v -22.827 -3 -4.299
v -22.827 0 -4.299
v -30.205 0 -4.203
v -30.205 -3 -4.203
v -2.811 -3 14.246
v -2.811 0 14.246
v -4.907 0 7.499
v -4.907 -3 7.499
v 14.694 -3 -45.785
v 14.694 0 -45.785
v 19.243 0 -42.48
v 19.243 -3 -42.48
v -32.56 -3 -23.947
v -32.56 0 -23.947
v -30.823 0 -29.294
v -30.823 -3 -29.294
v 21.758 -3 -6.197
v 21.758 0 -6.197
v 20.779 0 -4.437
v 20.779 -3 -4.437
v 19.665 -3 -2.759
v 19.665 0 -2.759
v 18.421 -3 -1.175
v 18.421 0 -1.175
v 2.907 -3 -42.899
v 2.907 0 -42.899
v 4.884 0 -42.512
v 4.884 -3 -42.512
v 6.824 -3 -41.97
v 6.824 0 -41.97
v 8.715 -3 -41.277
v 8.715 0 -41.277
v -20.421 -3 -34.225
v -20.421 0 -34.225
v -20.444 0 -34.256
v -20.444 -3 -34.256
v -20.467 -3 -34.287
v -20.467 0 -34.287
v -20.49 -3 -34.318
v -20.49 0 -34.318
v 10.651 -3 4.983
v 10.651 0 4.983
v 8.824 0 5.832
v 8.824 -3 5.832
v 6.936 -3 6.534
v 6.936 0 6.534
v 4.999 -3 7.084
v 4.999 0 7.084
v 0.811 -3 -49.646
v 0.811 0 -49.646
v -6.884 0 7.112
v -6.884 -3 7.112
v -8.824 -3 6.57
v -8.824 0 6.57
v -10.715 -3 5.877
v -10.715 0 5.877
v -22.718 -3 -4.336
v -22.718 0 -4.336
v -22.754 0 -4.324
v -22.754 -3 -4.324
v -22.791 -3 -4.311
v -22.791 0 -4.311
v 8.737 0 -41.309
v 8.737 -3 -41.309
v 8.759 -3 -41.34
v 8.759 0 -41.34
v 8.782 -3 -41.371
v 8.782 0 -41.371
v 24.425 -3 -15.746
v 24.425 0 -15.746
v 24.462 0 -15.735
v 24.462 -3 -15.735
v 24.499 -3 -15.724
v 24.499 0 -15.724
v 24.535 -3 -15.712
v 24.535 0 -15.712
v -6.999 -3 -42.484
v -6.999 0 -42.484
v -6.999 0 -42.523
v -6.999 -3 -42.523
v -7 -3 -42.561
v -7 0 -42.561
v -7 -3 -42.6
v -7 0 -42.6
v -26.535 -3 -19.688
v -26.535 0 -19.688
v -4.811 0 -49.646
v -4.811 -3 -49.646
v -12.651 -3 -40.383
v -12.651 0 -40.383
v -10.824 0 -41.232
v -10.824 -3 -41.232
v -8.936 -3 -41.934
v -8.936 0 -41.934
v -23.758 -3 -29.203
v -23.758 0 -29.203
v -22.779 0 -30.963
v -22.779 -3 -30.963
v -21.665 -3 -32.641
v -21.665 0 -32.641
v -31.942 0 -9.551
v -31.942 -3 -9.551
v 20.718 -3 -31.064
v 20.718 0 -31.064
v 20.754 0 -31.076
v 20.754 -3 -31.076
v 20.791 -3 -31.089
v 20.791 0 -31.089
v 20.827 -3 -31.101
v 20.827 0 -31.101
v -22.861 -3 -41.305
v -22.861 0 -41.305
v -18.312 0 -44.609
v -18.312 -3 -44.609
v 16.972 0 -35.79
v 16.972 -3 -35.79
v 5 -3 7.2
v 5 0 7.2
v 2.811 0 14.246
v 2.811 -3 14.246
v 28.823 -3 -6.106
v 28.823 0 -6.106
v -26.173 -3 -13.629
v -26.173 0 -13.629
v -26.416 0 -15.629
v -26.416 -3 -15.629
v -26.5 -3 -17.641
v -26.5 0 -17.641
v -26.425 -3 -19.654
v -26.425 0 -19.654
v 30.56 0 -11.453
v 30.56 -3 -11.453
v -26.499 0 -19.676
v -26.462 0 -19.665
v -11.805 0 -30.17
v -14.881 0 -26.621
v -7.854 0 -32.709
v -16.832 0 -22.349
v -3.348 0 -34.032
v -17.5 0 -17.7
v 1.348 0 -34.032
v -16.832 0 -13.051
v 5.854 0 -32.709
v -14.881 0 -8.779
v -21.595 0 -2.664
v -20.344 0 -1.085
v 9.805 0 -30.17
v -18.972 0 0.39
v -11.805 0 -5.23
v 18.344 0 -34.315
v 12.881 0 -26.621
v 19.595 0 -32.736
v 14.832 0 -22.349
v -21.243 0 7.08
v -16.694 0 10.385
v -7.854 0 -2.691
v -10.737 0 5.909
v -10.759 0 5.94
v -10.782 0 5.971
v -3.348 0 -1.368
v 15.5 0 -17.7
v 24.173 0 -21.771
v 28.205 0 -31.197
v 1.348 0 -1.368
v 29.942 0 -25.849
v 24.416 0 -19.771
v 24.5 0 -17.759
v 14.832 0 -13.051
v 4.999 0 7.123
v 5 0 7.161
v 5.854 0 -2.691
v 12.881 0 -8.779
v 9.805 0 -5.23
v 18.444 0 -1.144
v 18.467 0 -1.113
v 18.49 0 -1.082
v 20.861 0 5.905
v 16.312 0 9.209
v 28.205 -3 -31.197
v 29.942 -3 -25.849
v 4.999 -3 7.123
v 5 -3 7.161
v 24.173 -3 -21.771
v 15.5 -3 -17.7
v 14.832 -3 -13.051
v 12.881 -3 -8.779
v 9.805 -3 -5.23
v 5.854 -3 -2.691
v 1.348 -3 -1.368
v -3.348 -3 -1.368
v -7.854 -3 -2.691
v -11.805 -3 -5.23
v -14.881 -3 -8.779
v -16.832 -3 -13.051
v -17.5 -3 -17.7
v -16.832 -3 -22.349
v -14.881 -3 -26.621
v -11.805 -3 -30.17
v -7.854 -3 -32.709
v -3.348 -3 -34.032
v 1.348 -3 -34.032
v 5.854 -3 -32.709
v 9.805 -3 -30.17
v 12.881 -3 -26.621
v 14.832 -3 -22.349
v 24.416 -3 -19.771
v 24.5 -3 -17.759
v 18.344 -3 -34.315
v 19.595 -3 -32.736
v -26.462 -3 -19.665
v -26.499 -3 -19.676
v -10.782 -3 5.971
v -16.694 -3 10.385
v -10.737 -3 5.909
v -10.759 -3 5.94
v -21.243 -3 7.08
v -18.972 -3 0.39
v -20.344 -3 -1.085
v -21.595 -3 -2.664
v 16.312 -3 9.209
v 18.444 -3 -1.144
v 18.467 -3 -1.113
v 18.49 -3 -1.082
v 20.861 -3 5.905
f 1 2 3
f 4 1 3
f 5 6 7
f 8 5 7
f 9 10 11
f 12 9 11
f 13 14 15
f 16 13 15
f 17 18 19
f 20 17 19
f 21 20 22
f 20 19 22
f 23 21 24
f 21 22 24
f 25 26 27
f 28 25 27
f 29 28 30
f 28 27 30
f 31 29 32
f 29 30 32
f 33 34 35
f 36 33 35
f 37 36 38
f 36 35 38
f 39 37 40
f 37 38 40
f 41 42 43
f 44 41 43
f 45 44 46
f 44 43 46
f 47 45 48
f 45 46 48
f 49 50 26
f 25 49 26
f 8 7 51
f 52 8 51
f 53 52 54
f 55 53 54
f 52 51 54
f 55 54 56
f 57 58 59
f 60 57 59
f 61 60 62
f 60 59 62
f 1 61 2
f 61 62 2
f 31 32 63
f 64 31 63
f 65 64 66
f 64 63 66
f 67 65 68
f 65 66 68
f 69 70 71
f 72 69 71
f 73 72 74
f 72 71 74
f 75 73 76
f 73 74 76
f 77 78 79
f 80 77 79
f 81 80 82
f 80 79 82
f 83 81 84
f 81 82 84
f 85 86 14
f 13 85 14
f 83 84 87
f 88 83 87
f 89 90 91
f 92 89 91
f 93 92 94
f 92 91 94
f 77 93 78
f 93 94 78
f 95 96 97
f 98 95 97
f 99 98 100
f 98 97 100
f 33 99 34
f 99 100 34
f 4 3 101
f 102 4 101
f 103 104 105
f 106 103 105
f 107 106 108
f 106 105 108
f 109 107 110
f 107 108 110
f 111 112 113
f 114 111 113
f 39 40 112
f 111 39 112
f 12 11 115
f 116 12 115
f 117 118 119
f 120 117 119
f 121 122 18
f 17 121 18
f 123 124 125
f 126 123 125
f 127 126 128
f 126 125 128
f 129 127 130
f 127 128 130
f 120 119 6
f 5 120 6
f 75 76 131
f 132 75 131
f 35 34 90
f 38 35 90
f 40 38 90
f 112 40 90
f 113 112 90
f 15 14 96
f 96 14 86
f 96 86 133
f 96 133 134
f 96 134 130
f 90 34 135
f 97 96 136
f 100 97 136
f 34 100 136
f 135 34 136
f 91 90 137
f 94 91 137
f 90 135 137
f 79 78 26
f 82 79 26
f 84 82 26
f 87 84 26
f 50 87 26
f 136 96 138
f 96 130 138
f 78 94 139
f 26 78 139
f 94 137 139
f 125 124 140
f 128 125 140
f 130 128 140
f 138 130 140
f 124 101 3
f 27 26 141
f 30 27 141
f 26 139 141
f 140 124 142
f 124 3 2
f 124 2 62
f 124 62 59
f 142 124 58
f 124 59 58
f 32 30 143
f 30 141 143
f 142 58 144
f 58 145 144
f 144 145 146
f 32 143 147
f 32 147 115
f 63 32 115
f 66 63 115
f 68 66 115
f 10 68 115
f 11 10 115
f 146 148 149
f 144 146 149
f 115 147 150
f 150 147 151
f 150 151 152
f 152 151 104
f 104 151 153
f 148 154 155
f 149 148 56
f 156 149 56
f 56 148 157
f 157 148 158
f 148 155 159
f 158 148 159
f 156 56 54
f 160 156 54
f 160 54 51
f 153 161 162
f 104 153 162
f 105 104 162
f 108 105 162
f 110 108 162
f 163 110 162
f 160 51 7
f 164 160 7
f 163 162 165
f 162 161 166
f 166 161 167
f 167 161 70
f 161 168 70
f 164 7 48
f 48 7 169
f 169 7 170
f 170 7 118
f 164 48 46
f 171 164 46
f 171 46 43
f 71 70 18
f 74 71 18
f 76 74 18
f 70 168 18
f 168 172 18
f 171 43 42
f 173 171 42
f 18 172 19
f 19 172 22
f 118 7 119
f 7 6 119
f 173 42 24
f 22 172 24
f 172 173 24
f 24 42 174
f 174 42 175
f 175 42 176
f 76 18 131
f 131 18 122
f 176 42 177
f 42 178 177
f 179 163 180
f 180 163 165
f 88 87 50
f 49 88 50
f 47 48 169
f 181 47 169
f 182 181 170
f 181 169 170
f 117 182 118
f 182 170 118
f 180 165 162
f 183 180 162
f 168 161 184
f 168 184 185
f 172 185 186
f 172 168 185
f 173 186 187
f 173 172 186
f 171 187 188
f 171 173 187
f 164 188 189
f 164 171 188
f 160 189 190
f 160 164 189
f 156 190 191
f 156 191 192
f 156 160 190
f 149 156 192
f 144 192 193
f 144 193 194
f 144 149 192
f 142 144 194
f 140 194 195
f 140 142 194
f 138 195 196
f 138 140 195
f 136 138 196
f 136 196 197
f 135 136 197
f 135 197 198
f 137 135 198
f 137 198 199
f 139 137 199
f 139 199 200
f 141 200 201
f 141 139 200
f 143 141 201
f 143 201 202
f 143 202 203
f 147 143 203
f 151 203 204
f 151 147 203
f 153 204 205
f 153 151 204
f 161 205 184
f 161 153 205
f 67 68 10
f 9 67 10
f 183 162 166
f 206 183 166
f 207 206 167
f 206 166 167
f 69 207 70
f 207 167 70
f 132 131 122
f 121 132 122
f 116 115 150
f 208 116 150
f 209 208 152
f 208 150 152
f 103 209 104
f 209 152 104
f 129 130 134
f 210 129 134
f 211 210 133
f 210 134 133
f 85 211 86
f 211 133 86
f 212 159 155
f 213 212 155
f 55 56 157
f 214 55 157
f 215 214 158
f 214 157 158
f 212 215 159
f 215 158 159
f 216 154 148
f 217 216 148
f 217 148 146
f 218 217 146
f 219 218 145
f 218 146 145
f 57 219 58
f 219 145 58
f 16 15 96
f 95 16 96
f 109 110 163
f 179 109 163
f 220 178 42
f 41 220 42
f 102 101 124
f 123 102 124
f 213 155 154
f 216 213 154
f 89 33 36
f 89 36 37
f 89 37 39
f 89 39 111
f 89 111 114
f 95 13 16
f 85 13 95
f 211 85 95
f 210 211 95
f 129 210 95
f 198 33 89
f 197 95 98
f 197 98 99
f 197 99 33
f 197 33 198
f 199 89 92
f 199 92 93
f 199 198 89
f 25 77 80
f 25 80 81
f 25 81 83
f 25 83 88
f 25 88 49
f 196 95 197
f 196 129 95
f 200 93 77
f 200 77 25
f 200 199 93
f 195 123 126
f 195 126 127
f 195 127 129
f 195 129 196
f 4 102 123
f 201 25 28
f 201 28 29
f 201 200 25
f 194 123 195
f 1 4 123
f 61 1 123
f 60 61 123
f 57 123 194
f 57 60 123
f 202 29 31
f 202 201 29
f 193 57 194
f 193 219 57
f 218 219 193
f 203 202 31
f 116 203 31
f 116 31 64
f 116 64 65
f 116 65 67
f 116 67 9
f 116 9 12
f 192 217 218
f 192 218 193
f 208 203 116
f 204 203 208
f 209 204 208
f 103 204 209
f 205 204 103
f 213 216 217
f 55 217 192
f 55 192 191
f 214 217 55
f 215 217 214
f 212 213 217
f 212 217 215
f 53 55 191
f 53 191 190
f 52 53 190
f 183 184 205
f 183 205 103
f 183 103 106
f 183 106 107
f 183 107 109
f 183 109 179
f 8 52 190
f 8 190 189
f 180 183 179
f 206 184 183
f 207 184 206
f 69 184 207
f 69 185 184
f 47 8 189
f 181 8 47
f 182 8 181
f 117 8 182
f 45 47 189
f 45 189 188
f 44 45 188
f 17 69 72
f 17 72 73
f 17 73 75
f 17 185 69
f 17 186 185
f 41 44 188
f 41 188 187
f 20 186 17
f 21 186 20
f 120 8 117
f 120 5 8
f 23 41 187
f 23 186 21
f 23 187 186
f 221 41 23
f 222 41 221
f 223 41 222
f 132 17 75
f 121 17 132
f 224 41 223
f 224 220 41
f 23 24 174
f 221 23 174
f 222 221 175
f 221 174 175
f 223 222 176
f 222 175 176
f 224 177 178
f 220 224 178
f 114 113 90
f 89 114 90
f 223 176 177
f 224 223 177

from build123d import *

# Parameters (mm, degrees)
F0_R     = 16.5
F1_DEPTH = 3
F2_DEPTH = 3


with BuildPart() as f1:
    # F0 (on Front) → F1 (new body)
    with BuildSketch(Plane.XZ):
        with BuildLine():
            ThreePointArc((10.650584, 4.982898), (7.88696, 6.201296), (4.998663, 7.084391))
            ThreePointArc((4.998663, 7.084391), (4.999666, 7.142192), (5, 7.2))
            Line((5, 7.2), (2.811259, 14.245932))
            Line((2.811259, 14.245932), (-2.811259, 14.245932))
            Line((-2.811259, 14.245932), (-4.907152, 7.498892))
            ThreePointArc((-4.907152, 7.498892), (-7.859128, 6.860178), (-10.714879, 5.876919))
            ThreePointArc((-10.714879, 5.876919), (-10.748042, 5.92427), (-10.781751, 5.971235))
            Line((-10.781751, 5.971235), (-16.693975, 10.385003))
            Line((-16.693975, 10.385003), (-21.242687, 7.080171))
            Line((-21.242687, 7.080171), (-18.97249, 0.389765))
            ThreePointArc((-18.97249, 0.389765), (-20.985262, -1.862092), (-22.717668, -4.336134))
            ThreePointArc((-22.717668, -4.336134), (-22.77233, -4.317319), (-22.827205, -4.299138))
            Line((-22.827205, -4.299138), (-30.204643, -4.203442))
            Line((-30.204643, -4.203442), (-31.942096, -9.550773))
            Line((-31.942096, -9.550773), (-26.172947, -13.629037))
            ThreePointArc((-26.172947, -13.629037), (-26.477705, -16.633906), (-26.425045, -19.65373))
            ThreePointArc((-26.425045, -19.65373), (-26.480327, -19.670638), (-26.535409, -19.688184))
            Line((-26.535409, -19.688184), (-32.56013, -23.947114))
            Line((-32.56013, -23.947114), (-30.822677, -29.294445))
            Line((-30.822677, -29.294445), (-23.758194, -29.202809))
            ThreePointArc((-23.758194, -29.202809), (-22.238531, -31.812931), (-20.42092, -34.225068))
            ThreePointArc((-20.42092, -34.225068), (-20.455705, -34.27124), (-20.489955, -34.317812))
            Line((-20.489955, -34.317812), (-22.860721, -41.3046))
            Line((-22.860721, -41.3046), (-18.312009, -44.609433))
            Line((-18.312009, -44.609433), (-12.650584, -40.382898))
            ThreePointArc((-12.650584, -40.382898), (-9.88696, -41.601296), (-6.998663, -42.484391))
            ThreePointArc((-6.998663, -42.484391), (-6.999666, -42.542192), (-7, -42.6))
            Line((-7, -42.6), (-4.811259, -49.645932))
            Line((-4.811259, -49.645932), (0.811259, -49.645932))
            Line((0.811259, -49.645932), (2.907152, -42.898892))
            ThreePointArc((2.907152, -42.898892), (5.859128, -42.260178), (8.714879, -41.276919))
            ThreePointArc((8.714879, -41.276919), (8.748042, -41.32427), (8.781751, -41.371235))
            Line((8.781751, -41.371235), (14.693975, -45.785003))
            Line((14.693975, -45.785003), (19.242687, -42.480171))
            Line((19.242687, -42.480171), (16.97249, -35.789765))
            ThreePointArc((16.97249, -35.789765), (18.985262, -33.537908), (20.717668, -31.063866))
            ThreePointArc((20.717668, -31.063866), (20.77233, -31.082681), (20.827205, -31.100862))
            Line((20.827205, -31.100862), (28.204643, -31.196558))
            Line((28.204643, -31.196558), (29.942096, -25.849227))
            Line((29.942096, -25.849227), (24.172947, -21.770963))
            ThreePointArc((24.172947, -21.770963), (24.477705, -18.766094), (24.425045, -15.74627))
            ThreePointArc((24.425045, -15.74627), (24.480327, -15.729362), (24.535409, -15.711816))
            Line((24.535409, -15.711816), (30.56013, -11.452886))
            Line((30.56013, -11.452886), (28.822677, -6.105555))
            Line((28.822677, -6.105555), (21.758194, -6.197191))
            ThreePointArc((21.758194, -6.197191), (20.238531, -3.587069), (18.42092, -1.174932))
            ThreePointArc((18.42092, -1.174932), (18.455705, -1.12876), (18.489955, -1.082188))
            Line((18.489955, -1.082188), (20.860721, 5.9046))
            Line((20.860721, 5.9046), (16.312009, 9.209433))
            Line((16.312009, 9.209433), (10.650584, 4.982898))
        make_face()
        with Locations((-1, -17.7)):
            Circle(F0_R, mode=Mode.SUBTRACT)
    extrude(amount=F1_DEPTH)

    # F0 (on Front) → F2 (join)
    with BuildSketch(Plane.XZ):
        with BuildLine():
            ThreePointArc((10.650584, 4.982898), (7.88696, 6.201296), (4.998663, 7.084391))
            ThreePointArc((4.998663, 7.084391), (4.999666, 7.142192), (5, 7.2))
            Line((5, 7.2), (2.811259, 14.245932))
            Line((2.811259, 14.245932), (-2.811259, 14.245932))
            Line((-2.811259, 14.245932), (-4.907152, 7.498892))
            ThreePointArc((-4.907152, 7.498892), (-7.859128, 6.860178), (-10.714879, 5.876919))
            ThreePointArc((-10.714879, 5.876919), (-10.748042, 5.92427), (-10.781751, 5.971235))
            Line((-10.781751, 5.971235), (-16.693975, 10.385003))
            Line((-16.693975, 10.385003), (-21.242687, 7.080171))
            Line((-21.242687, 7.080171), (-18.97249, 0.389765))
            ThreePointArc((-18.97249, 0.389765), (-20.985262, -1.862092), (-22.717668, -4.336134))
            ThreePointArc((-22.717668, -4.336134), (-22.77233, -4.317319), (-22.827205, -4.299138))
            Line((-22.827205, -4.299138), (-30.204643, -4.203442))
            Line((-30.204643, -4.203442), (-31.942096, -9.550773))
            Line((-31.942096, -9.550773), (-26.172947, -13.629037))
            ThreePointArc((-26.172947, -13.629037), (-26.477705, -16.633906), (-26.425045, -19.65373))
            ThreePointArc((-26.425045, -19.65373), (-26.480327, -19.670638), (-26.535409, -19.688184))
            Line((-26.535409, -19.688184), (-32.56013, -23.947114))
            Line((-32.56013, -23.947114), (-30.822677, -29.294445))
            Line((-30.822677, -29.294445), (-23.758194, -29.202809))
            ThreePointArc((-23.758194, -29.202809), (-22.238531, -31.812931), (-20.42092, -34.225068))
            ThreePointArc((-20.42092, -34.225068), (-20.455705, -34.27124), (-20.489955, -34.317812))
            Line((-20.489955, -34.317812), (-22.860721, -41.3046))
            Line((-22.860721, -41.3046), (-18.312009, -44.609433))
            Line((-18.312009, -44.609433), (-12.650584, -40.382898))
            ThreePointArc((-12.650584, -40.382898), (-9.88696, -41.601296), (-6.998663, -42.484391))
            ThreePointArc((-6.998663, -42.484391), (-6.999666, -42.542192), (-7, -42.6))
            Line((-7, -42.6), (-4.811259, -49.645932))
            Line((-4.811259, -49.645932), (0.811259, -49.645932))
            Line((0.811259, -49.645932), (2.907152, -42.898892))
            ThreePointArc((2.907152, -42.898892), (5.859128, -42.260178), (8.714879, -41.276919))
            ThreePointArc((8.714879, -41.276919), (8.748042, -41.32427), (8.781751, -41.371235))
            Line((8.781751, -41.371235), (14.693975, -45.785003))
            Line((14.693975, -45.785003), (19.242687, -42.480171))
            Line((19.242687, -42.480171), (16.97249, -35.789765))
            ThreePointArc((16.97249, -35.789765), (18.985262, -33.537908), (20.717668, -31.063866))
            ThreePointArc((20.717668, -31.063866), (20.77233, -31.082681), (20.827205, -31.100862))
            Line((20.827205, -31.100862), (28.204643, -31.196558))
            Line((28.204643, -31.196558), (29.942096, -25.849227))
            Line((29.942096, -25.849227), (24.172947, -21.770963))
            ThreePointArc((24.172947, -21.770963), (24.477705, -18.766094), (24.425045, -15.74627))
            ThreePointArc((24.425045, -15.74627), (24.480327, -15.729362), (24.535409, -15.711816))
            Line((24.535409, -15.711816), (30.56013, -11.452886))
            Line((30.56013, -11.452886), (28.822677, -6.105555))
            Line((28.822677, -6.105555), (21.758194, -6.197191))
            ThreePointArc((21.758194, -6.197191), (20.238531, -3.587069), (18.42092, -1.174932))
            ThreePointArc((18.42092, -1.174932), (18.455705, -1.12876), (18.489955, -1.082188))
            Line((18.489955, -1.082188), (20.860721, 5.9046))
            Line((20.860721, 5.9046), (16.312009, 9.209433))
            Line((16.312009, 9.209433), (10.650584, 4.982898))
        make_face()
        with Locations((-1, -17.7)):
            Circle(F0_R, mode=Mode.SUBTRACT)
    extrude(amount=F2_DEPTH)


solid = f1.part
